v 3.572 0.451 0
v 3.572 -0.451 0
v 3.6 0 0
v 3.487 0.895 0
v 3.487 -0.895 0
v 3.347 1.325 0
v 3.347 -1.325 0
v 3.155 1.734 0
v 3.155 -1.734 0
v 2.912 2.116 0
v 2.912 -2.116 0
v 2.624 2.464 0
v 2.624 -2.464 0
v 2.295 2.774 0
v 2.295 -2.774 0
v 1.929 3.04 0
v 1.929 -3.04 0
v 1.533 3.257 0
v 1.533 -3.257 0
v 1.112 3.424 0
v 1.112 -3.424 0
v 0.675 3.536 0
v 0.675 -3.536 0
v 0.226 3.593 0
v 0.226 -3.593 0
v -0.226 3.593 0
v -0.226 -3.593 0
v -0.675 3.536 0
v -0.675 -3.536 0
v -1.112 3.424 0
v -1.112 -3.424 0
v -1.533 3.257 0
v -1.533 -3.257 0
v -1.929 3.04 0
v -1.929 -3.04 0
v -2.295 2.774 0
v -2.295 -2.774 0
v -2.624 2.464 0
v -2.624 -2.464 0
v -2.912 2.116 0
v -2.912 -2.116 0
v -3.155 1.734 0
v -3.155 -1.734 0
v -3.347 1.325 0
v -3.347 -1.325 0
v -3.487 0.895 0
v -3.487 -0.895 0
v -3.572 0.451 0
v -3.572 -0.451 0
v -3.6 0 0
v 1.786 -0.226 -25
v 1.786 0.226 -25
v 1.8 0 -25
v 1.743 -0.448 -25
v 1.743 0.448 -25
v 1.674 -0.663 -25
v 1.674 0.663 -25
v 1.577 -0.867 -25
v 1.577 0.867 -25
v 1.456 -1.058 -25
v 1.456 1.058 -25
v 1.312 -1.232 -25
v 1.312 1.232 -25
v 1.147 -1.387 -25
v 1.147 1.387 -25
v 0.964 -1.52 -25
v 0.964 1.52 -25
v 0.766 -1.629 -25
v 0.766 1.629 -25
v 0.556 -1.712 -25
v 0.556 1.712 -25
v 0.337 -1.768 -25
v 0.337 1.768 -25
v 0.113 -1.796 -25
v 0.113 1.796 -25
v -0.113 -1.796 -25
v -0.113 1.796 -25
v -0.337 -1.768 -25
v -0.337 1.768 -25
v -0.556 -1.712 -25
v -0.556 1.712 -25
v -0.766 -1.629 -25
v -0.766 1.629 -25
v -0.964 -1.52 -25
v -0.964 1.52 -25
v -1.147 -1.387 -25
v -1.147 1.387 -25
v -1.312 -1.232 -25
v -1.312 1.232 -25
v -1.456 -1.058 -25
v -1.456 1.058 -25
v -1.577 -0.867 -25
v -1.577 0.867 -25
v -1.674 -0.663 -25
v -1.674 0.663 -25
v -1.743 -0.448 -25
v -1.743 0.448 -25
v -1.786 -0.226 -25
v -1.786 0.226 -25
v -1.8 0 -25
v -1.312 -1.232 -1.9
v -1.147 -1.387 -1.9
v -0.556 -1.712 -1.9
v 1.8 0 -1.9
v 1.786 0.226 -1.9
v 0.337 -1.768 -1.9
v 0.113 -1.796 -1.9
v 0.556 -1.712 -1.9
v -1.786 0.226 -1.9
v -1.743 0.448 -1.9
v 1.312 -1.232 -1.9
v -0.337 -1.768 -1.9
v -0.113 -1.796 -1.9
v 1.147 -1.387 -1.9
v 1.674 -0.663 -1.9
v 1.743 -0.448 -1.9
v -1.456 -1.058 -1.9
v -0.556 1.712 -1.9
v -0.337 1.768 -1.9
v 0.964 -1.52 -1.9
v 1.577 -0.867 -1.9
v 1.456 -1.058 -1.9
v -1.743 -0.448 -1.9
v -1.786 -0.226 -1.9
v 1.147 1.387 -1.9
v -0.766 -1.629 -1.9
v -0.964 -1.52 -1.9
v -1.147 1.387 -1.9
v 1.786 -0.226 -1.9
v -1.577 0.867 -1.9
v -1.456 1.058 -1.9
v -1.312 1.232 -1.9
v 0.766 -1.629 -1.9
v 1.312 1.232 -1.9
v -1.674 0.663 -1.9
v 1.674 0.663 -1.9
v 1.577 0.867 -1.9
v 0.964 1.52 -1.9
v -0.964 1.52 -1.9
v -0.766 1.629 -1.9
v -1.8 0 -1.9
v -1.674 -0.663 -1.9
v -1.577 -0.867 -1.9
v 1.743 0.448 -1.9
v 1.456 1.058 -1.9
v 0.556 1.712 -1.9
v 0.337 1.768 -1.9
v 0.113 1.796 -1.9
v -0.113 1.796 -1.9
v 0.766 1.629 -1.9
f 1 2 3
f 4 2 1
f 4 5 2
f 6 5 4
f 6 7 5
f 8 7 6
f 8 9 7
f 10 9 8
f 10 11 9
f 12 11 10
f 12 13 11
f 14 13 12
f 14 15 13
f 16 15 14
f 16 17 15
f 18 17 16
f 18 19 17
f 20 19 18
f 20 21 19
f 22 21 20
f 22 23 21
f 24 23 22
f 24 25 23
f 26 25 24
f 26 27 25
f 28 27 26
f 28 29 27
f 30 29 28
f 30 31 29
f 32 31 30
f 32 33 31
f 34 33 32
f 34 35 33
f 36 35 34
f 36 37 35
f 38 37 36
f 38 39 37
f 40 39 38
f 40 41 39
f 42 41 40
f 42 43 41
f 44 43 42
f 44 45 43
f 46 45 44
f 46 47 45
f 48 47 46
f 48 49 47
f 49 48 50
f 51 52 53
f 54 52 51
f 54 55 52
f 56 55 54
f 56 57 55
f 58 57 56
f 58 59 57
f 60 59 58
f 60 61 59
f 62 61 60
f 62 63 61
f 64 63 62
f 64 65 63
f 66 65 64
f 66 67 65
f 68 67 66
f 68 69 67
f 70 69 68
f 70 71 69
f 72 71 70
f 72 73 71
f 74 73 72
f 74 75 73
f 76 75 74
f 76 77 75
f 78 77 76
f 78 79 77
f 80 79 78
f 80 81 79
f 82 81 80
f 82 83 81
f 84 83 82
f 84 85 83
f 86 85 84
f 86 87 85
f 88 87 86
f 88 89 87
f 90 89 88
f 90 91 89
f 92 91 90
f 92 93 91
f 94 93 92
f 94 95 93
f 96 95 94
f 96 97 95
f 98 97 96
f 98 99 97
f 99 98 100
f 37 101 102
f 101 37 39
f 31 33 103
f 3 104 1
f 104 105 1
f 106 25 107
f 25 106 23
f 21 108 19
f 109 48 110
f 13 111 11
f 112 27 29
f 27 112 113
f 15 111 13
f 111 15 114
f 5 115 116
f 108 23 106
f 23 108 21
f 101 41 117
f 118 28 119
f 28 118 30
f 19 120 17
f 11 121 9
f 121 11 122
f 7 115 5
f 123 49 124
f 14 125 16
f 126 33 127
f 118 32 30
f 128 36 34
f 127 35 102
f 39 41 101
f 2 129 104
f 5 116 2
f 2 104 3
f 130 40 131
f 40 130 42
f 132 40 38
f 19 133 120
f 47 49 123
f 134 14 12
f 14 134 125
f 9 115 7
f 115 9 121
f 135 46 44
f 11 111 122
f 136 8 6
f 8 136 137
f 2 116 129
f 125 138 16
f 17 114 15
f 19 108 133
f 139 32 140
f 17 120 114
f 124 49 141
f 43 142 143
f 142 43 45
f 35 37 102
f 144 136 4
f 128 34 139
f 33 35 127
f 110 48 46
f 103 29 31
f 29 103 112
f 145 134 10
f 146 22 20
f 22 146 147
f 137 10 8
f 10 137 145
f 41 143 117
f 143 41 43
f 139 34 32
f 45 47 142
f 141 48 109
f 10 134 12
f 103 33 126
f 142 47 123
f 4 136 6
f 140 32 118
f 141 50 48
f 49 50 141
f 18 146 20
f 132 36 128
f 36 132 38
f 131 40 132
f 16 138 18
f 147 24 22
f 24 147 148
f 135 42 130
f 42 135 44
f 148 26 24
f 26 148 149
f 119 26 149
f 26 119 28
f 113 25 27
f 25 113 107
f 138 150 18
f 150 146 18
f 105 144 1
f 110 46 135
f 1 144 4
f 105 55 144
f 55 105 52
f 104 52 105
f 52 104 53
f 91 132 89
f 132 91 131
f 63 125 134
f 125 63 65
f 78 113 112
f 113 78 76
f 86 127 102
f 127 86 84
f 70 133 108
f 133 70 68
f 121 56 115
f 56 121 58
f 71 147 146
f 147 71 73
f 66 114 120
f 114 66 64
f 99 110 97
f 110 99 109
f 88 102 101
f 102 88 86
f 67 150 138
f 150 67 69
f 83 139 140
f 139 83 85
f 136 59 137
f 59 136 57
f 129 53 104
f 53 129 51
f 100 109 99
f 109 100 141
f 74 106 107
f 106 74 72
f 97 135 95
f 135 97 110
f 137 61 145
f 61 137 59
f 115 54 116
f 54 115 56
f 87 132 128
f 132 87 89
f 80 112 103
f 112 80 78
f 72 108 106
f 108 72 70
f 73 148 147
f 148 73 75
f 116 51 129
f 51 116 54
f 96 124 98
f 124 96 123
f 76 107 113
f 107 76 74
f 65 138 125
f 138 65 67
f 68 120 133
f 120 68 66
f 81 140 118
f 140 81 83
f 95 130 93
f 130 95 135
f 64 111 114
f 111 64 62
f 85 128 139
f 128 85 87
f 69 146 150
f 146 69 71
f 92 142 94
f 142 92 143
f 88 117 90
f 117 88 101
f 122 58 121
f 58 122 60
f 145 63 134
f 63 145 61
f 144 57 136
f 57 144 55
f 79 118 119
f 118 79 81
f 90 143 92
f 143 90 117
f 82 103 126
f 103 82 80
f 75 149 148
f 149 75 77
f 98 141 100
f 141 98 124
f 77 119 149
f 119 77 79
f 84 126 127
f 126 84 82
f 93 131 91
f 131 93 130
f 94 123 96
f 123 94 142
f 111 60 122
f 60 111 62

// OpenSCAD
$fn = 50;


difference() {
	union() {
		translate(v = [0, 0, 0]) {
			rotate(a = [0, 0, 0]) {
				difference() {
					union() {
						translate(v = [0, 0, -25.0000000000]) {
							cylinder(h = 25, r = 1.5000000000);
						}
						translate(v = [0, 0, -1.9000000000]) {
							cylinder(h = 1.9000000000, r1 = 1.8000000000, r2 = 3.6000000000);
						}
						translate(v = [0, 0, -25.0000000000]) {
							cylinder(h = 25, r = 1.8000000000);
						}
						translate(v = [0, 0, -25.0000000000]) {
							cylinder(h = 25, r = 1.5000000000);
						}
					}
					union();
				}
			}
		}
	}
	union();
}
